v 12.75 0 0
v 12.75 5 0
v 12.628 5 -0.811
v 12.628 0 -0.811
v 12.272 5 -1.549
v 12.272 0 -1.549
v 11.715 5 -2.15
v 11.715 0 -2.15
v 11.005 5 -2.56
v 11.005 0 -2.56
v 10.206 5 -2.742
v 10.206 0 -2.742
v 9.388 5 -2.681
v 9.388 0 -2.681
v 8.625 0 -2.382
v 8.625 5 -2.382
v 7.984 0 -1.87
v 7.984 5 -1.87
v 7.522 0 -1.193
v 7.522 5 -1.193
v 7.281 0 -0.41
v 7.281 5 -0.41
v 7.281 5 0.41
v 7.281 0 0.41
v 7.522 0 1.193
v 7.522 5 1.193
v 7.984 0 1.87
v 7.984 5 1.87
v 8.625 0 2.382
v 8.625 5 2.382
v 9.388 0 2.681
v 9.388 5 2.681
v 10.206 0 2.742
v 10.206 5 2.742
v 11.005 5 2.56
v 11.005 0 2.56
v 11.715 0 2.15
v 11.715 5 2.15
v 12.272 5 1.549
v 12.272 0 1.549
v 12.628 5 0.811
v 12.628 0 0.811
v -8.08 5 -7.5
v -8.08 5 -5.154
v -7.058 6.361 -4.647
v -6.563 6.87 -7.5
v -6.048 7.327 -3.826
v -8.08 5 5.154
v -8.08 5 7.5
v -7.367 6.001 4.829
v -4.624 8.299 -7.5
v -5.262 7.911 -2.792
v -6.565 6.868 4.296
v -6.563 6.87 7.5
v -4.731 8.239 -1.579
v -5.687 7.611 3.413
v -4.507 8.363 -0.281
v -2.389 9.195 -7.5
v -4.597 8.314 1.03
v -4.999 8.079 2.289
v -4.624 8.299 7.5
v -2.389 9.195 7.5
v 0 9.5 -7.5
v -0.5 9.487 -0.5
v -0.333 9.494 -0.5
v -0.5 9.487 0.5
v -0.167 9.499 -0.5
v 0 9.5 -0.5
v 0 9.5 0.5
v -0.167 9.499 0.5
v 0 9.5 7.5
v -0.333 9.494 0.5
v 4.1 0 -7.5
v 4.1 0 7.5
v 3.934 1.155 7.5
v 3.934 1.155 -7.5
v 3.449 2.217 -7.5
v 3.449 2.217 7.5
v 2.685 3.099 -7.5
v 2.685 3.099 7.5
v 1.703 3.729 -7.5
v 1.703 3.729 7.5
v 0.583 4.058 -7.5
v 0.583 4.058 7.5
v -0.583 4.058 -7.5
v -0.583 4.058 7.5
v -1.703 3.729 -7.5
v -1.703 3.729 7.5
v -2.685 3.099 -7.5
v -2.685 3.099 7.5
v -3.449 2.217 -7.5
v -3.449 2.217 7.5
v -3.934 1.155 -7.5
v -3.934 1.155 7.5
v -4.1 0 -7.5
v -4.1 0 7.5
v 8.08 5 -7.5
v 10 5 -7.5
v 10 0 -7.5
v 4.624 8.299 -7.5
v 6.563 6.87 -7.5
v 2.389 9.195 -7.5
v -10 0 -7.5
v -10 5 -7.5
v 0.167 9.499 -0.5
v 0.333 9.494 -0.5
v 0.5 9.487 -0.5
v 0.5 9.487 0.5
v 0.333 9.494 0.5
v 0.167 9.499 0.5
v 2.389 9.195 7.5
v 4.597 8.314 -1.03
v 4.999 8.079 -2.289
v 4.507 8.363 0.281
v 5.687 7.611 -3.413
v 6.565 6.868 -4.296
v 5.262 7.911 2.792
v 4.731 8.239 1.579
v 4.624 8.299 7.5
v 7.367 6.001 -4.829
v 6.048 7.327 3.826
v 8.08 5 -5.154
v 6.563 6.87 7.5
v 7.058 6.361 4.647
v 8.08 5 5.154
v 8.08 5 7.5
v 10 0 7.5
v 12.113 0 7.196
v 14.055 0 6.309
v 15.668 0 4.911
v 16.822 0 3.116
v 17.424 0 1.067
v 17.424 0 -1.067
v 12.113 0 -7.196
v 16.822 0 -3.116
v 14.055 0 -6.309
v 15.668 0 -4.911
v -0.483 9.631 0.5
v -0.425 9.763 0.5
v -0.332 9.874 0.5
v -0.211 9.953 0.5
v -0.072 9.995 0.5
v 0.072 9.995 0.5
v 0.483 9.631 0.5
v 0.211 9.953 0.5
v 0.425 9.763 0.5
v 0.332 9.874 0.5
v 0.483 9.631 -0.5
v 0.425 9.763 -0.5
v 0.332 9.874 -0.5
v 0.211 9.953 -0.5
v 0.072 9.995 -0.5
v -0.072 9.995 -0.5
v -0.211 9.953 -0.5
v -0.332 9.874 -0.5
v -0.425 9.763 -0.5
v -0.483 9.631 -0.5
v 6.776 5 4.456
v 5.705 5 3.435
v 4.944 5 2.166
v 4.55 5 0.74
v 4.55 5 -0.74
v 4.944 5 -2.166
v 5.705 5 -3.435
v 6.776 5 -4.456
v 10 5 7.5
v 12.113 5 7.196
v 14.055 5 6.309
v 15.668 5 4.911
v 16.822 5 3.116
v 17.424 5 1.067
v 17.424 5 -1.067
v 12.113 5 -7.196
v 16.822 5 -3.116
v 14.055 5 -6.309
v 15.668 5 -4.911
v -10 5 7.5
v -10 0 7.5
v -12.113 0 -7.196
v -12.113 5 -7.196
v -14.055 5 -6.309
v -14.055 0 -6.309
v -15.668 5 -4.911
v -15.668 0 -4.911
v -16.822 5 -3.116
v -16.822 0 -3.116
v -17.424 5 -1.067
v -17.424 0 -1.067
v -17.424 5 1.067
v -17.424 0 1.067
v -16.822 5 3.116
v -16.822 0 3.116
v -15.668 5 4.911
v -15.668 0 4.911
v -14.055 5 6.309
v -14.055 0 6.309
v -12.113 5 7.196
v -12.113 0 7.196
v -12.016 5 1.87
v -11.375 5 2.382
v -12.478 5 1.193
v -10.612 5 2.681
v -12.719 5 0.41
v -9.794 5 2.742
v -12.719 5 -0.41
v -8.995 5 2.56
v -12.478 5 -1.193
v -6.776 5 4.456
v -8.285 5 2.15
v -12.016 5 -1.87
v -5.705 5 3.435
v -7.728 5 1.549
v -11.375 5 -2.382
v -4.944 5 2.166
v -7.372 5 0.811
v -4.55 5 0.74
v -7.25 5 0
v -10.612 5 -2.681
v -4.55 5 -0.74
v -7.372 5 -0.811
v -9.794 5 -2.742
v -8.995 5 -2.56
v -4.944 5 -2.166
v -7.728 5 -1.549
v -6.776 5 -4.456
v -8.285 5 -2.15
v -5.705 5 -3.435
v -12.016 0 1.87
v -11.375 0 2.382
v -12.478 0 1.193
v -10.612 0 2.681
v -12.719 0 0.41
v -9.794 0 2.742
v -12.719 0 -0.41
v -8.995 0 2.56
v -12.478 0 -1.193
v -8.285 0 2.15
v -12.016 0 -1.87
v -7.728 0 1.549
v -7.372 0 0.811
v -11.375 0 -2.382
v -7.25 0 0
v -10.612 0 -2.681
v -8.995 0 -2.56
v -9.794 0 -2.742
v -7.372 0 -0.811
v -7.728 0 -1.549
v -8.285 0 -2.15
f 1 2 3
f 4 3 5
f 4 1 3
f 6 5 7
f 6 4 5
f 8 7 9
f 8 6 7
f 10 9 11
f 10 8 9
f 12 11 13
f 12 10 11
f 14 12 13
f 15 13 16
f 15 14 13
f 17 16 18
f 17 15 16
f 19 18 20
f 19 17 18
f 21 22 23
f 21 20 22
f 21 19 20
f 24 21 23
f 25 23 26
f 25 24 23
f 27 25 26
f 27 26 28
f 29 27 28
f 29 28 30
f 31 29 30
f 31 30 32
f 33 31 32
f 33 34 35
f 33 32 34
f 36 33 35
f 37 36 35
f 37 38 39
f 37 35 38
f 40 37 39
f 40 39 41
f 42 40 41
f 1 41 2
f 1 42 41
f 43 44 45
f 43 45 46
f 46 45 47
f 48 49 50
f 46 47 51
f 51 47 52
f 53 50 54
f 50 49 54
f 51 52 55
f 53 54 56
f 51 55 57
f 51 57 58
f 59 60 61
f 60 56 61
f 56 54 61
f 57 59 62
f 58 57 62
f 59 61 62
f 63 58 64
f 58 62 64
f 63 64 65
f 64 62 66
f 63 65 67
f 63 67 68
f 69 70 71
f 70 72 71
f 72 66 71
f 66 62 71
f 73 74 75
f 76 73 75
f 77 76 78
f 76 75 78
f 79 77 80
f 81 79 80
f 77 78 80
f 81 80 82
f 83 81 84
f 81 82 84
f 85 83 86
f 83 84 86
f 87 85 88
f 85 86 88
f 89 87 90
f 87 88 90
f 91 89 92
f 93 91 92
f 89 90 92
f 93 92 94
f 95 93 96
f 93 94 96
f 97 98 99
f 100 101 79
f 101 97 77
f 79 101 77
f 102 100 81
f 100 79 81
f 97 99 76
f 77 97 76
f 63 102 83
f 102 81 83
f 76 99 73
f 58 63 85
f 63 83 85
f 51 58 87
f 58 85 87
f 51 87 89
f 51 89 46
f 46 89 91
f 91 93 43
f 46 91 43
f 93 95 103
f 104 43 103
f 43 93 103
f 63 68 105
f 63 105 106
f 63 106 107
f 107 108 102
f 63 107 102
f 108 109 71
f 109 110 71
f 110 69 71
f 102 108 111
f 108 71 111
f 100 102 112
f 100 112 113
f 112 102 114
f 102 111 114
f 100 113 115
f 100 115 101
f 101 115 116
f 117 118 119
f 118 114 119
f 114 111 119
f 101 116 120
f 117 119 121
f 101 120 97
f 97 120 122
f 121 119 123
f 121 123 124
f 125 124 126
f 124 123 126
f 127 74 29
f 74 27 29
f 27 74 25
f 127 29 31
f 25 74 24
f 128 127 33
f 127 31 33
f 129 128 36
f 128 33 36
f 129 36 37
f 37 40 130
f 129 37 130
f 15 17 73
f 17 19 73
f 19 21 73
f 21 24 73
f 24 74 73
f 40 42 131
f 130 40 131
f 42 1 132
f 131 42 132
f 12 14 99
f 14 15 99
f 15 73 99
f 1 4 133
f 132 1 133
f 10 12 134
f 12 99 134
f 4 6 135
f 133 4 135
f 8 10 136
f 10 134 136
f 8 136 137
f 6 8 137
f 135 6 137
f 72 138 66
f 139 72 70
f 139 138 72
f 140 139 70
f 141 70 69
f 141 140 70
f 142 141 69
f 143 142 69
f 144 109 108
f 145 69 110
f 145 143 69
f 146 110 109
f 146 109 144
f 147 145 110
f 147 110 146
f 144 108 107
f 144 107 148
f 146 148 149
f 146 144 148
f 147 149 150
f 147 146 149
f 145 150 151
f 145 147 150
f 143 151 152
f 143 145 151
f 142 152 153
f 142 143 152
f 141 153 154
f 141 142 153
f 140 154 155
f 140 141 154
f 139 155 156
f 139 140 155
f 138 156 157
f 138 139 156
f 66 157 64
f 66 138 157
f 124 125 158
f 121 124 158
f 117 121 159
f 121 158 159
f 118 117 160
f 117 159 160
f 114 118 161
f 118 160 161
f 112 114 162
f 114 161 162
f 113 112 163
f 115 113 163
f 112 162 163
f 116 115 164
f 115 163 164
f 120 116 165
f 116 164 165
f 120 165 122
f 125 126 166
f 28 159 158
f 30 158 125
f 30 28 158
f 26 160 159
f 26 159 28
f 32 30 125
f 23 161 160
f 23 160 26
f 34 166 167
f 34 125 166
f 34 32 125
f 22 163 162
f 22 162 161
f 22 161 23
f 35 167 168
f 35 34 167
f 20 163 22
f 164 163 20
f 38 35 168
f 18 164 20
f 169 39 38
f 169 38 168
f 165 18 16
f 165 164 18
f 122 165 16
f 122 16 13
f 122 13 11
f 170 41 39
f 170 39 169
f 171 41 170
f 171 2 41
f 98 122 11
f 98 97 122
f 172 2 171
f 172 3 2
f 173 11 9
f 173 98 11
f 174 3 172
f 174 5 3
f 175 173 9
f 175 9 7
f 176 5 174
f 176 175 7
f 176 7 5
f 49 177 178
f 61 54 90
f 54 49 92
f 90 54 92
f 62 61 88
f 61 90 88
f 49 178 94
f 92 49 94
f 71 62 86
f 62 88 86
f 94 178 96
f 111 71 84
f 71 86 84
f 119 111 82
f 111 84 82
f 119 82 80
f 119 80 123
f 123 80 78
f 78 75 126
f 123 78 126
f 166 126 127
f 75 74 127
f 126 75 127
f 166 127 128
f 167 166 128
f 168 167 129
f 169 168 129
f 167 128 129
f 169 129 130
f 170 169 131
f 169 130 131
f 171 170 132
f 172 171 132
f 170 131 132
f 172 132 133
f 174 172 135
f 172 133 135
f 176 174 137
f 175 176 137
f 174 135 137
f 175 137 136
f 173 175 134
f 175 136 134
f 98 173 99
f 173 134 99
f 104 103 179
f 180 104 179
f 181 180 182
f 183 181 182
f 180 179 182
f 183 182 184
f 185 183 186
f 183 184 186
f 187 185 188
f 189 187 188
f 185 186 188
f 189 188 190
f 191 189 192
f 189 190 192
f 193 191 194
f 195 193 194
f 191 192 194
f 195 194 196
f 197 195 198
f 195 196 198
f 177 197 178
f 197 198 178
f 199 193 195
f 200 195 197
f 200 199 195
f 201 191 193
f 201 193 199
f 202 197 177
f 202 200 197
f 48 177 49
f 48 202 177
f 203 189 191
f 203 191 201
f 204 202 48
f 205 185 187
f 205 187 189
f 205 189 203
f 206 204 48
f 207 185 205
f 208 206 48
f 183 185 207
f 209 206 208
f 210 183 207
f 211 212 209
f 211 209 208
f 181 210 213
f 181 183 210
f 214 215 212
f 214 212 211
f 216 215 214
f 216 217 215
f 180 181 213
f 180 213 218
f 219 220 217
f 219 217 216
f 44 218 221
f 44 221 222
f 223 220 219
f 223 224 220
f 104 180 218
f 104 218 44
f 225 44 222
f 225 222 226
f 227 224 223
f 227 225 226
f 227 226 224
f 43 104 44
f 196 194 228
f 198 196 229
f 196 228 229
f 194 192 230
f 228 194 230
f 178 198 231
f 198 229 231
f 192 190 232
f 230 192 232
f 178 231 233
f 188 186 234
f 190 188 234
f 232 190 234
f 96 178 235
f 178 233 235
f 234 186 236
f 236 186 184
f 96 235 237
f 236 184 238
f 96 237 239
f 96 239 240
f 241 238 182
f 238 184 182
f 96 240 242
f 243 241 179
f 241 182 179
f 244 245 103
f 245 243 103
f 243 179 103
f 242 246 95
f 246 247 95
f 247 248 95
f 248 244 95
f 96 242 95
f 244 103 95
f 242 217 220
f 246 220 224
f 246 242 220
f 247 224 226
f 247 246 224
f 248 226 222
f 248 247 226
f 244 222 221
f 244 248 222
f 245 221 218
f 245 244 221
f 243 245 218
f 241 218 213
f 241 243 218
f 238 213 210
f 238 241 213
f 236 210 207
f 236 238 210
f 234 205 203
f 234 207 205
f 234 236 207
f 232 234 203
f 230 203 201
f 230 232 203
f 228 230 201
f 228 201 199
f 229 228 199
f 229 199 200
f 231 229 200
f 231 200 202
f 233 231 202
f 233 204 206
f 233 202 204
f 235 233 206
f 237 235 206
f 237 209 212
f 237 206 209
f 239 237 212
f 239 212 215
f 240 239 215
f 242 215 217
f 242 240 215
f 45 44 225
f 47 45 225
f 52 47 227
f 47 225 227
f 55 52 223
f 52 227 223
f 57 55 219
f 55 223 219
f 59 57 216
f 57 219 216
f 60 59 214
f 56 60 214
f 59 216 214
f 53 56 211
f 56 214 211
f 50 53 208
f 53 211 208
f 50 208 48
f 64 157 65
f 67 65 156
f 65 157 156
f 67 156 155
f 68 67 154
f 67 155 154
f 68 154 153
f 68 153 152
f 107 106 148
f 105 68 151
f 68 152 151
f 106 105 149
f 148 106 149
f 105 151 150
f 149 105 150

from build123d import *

# Parameters (mm, degrees)
BOSS_EXTRUDE1_DEPTH = 9.5
SKETCH1_3_R         = 2.75
BOSS_EXTRUDE2_DEPTH = 5
CUT_EXTRUDE2_DEPTH  = 25.929901725
BOSS_EXTRUDE3_DEPTH = 0.5


with BuildPart() as part:
    # Sketch1 → Boss-Extrude1 (new body)
    with BuildSketch(Plane(origin=(0, 0, 0), x_dir=(1, 0, 0), z_dir=(0, 1, 0))):
        with BuildLine():
            Line((8.08, 7.5), (-8.08, 7.5))
            Line((-8.08, 7.5), (-8.08, 5.153988747))
            ThreePointArc((-8.08, 5.153988747), (-4.5, 0), (-8.08, -5.153988747))
            Line((-8.08, -5.153988747), (-8.08, -7.5))
            Line((-8.08, -7.5), (8.08, -7.5))
            Line((8.08, -7.5), (8.08, -5.153988747))
            ThreePointArc((8.08, -5.153988747), (4.5, 0), (8.08, 5.153988747))
            Line((8.08, 5.153988747), (8.08, 7.5))
        make_face()
    extrude(amount=BOSS_EXTRUDE1_DEPTH)

    # Sketch1_3 → Boss-Extrude2 (add)
    # profile 1 of 2: a face of its own
    with BuildSketch(Plane(origin=(0, 0, 0), x_dir=(1, 0, 0), z_dir=(0, 1, 0))):
        with BuildLine():
            Line((-8.08, 5.153988747), (-8.08, 7.5))
            Line((-8.08, 7.5), (-10, 7.5))
            ThreePointArc((-10, 7.5), (-17.5, 0), (-10, -7.5))
            Line((-10, -7.5), (-8.08, -7.5))
            Line((-8.08, -7.5), (-8.08, -5.153988747))
            ThreePointArc((-8.08, -5.153988747), (-4.5, 0), (-8.08, 5.153988747))
        make_face()
        with Locations((-10, 0)):
            Circle(SKETCH1_3_R, mode=Mode.SUBTRACT)
    # profile 2 of 2: a face of its own
    with BuildSketch(Plane(origin=(0, 0, 0), x_dir=(1, 0, 0), z_dir=(0, 1, 0))):
        with BuildLine():
            Line((10, 7.5), (8.08, 7.5))
            Line((8.08, 7.5), (8.08, 5.153988747))
            ThreePointArc((8.08, 5.153988747), (4.5, 0), (8.08, -5.153988747))
            Line((8.08, -5.153988747), (8.08, -7.5))
            Line((8.08, -7.5), (10, -7.5))
            ThreePointArc((10, -7.5), (17.5, 0), (10, 7.5))
        make_face()
        with Locations((10, 0)):
            Circle(SKETCH1_3_R, mode=Mode.SUBTRACT)
    extrude(amount=BOSS_EXTRUDE2_DEPTH)

    # Sketch3 → Cut-Extrude2 (cut, through all)
    with BuildSketch(Plane.XY.offset(7.5)):
        with BuildLine():
            Line((1.6e-08, 9.5), (-8.08, 9.5))
            Line((-8.08, 9.5), (-8.08, 5))
            ThreePointArc((-8.08, 5), (-4.624294534, 8.299133313), (1.6e-08, 9.5))
        make_face()
        with BuildLine():
            Line((8.08, 9.5), (1.6e-08, 9.5))
            ThreePointArc((1.6e-08, 9.5), (4.624294548, 8.299133305), (8.08, 5))
            Line((8.08, 5), (8.08, 9.5))
        make_face()
        with BuildLine():
            Line((-4.1, 0), (4.1, 0))
            ThreePointArc((4.1, 0), (0, 4.1), (-4.1, 0))
        make_face()
    extrude(amount=-CUT_EXTRUDE2_DEPTH, mode=Mode.SUBTRACT)

    # Sketch7 → Boss-Extrude3 (add, symmetric)
    with BuildSketch(Plane.XY):
        with BuildLine():
            ThreePointArc((-0.499826987, 9.486847705), (0, 9.5), (0.499826987, 9.486847705))
            ThreePointArc((0.499826987, 9.486847705), (0, 10), (-0.499826987, 9.486847705))
        make_face()
    extrude(amount=BOSS_EXTRUDE3_DEPTH, both=True)


solid = part.part
